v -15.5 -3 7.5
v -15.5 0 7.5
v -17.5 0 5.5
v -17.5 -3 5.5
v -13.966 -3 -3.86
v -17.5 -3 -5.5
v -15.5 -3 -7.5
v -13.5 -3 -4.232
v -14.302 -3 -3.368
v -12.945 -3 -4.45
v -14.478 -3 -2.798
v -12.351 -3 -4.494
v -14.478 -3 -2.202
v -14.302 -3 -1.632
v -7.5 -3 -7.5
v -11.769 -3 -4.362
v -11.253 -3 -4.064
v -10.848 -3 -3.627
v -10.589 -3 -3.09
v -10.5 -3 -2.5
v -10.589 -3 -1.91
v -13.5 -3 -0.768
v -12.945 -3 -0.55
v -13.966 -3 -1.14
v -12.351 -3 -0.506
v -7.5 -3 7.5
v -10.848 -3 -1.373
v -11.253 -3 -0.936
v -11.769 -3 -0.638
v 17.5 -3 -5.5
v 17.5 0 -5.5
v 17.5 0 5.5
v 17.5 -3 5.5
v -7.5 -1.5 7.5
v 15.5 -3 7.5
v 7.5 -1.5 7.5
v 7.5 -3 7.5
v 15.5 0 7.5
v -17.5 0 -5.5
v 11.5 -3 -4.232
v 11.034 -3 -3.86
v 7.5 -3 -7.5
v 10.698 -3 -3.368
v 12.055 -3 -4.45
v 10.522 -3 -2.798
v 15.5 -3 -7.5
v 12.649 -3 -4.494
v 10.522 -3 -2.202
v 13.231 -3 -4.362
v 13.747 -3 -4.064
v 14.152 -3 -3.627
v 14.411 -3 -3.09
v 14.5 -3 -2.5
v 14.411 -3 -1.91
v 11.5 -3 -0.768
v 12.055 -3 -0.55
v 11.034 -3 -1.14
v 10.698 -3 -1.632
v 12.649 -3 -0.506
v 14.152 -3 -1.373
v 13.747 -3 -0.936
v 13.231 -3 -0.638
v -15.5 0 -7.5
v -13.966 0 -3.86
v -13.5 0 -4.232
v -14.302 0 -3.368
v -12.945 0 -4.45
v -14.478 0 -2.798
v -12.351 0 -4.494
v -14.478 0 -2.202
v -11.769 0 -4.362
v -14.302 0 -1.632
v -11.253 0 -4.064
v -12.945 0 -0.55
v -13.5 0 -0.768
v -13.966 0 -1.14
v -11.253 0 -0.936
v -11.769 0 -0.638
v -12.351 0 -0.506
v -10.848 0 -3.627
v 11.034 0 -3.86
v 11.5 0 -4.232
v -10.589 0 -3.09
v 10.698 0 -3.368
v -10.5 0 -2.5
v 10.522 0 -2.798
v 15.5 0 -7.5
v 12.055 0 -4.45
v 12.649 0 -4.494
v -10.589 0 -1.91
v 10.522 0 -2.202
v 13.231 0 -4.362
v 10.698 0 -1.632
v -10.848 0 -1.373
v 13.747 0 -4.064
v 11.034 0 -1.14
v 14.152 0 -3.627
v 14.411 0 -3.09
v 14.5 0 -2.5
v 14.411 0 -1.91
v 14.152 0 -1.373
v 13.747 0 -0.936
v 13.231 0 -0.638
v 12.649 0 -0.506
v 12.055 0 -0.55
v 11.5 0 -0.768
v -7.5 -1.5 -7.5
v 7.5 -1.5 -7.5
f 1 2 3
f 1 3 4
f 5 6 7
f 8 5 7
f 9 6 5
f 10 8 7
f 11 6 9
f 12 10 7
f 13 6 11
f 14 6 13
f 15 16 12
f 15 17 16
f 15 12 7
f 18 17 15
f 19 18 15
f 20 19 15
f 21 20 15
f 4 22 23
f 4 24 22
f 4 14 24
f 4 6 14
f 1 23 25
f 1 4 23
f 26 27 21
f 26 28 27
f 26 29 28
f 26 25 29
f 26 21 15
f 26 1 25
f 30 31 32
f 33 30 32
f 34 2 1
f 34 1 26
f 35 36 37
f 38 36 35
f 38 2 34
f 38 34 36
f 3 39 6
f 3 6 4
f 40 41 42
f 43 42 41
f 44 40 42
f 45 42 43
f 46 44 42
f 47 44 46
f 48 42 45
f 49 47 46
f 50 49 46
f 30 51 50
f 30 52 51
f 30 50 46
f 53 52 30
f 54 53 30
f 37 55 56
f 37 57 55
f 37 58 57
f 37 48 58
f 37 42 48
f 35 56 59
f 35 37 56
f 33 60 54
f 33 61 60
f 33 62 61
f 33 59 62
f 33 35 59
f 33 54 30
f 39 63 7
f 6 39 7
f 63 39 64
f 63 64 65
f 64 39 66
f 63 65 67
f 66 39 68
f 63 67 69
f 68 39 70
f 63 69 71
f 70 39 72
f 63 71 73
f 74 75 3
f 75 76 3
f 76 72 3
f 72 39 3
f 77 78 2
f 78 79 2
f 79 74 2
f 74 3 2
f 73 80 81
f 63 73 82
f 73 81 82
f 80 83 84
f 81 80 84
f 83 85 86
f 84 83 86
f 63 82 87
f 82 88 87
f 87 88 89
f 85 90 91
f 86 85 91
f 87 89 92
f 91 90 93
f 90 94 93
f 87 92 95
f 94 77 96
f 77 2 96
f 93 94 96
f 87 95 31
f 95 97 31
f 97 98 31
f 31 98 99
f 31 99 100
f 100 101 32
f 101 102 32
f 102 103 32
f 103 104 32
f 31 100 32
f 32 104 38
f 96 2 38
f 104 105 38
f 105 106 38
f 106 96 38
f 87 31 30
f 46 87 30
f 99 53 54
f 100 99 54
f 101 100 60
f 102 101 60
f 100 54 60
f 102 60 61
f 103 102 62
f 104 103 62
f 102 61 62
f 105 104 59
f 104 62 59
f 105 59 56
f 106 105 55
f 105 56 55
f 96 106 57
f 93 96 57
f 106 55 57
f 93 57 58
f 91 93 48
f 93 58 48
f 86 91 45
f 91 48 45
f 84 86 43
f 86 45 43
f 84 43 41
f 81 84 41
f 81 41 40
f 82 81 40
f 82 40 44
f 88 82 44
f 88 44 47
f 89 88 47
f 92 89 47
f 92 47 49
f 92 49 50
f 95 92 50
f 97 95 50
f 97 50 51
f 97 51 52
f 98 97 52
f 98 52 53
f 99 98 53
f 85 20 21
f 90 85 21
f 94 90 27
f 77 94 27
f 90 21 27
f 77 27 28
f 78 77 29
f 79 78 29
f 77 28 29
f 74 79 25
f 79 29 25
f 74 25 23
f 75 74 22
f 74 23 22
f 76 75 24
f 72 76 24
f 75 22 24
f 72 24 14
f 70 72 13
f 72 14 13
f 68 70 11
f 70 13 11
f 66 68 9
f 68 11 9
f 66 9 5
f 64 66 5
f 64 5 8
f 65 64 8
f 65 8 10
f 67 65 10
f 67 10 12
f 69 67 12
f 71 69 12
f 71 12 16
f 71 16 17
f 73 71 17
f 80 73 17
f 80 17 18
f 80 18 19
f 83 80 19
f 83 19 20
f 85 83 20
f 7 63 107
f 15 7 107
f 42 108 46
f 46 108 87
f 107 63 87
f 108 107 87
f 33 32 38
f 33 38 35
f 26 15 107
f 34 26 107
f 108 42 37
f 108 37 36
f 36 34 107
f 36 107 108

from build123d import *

# Parameters (mm, degrees)
F0_W     = 35
F0_H     = 15
F1_DEPTH = 4.5
F2_W     = 15
F2_H     = 1.5
F3_DEPTH = 15.001
F4_R     = 2
F5_DEPTH = 10
F6_SIZE  = 2
F7_W     = 39.253565
F7_H     = 1.5
F8_DEPTH = 15.001


with BuildPart() as f1:
    # F0 (on Front) → F1 (new body)
    with BuildSketch(Plane.XZ):
        Rectangle(F0_W, F0_H)
    extrude(amount=F1_DEPTH)

    # F2 (on face) → F3 (cut, through all)
    with BuildSketch(Plane.XY.offset(7.5)):
        with Locations((0, -2.25)):
            Rectangle(F2_W, F2_H)
    extrude(amount=-F3_DEPTH, mode=Mode.SUBTRACT)

    # F4 (on face) → F5 (cut)
    with BuildSketch(Plane.XZ.offset(4.5)):
        with Locations((12.5, -2.5)):
            Circle(F4_R)
        with Locations((-12.5, -2.5)):
            Circle(F4_R)
    extrude(amount=-F5_DEPTH, mode=Mode.SUBTRACT)

    # F6
    f6_edges = [f1.edges().sort_by_distance(p)[0] for p in [
        (-17.5, -2.25, 7.5),
        (17.5, -2.25, 7.5),
        (17.5, -2.25, -7.5),
        (-17.5, -2.25, -7.5),
    ]]
    chamfer(f6_edges, length=F6_SIZE)

    # F7 (on face) → F8 (cut, through all)
    with BuildSketch(Plane.XY.offset(7.5)):
        with Locations((0.571815, -3.75)):
            Rectangle(F7_W, F7_H)
    extrude(amount=-F8_DEPTH, mode=Mode.SUBTRACT)


solid = f1.part
